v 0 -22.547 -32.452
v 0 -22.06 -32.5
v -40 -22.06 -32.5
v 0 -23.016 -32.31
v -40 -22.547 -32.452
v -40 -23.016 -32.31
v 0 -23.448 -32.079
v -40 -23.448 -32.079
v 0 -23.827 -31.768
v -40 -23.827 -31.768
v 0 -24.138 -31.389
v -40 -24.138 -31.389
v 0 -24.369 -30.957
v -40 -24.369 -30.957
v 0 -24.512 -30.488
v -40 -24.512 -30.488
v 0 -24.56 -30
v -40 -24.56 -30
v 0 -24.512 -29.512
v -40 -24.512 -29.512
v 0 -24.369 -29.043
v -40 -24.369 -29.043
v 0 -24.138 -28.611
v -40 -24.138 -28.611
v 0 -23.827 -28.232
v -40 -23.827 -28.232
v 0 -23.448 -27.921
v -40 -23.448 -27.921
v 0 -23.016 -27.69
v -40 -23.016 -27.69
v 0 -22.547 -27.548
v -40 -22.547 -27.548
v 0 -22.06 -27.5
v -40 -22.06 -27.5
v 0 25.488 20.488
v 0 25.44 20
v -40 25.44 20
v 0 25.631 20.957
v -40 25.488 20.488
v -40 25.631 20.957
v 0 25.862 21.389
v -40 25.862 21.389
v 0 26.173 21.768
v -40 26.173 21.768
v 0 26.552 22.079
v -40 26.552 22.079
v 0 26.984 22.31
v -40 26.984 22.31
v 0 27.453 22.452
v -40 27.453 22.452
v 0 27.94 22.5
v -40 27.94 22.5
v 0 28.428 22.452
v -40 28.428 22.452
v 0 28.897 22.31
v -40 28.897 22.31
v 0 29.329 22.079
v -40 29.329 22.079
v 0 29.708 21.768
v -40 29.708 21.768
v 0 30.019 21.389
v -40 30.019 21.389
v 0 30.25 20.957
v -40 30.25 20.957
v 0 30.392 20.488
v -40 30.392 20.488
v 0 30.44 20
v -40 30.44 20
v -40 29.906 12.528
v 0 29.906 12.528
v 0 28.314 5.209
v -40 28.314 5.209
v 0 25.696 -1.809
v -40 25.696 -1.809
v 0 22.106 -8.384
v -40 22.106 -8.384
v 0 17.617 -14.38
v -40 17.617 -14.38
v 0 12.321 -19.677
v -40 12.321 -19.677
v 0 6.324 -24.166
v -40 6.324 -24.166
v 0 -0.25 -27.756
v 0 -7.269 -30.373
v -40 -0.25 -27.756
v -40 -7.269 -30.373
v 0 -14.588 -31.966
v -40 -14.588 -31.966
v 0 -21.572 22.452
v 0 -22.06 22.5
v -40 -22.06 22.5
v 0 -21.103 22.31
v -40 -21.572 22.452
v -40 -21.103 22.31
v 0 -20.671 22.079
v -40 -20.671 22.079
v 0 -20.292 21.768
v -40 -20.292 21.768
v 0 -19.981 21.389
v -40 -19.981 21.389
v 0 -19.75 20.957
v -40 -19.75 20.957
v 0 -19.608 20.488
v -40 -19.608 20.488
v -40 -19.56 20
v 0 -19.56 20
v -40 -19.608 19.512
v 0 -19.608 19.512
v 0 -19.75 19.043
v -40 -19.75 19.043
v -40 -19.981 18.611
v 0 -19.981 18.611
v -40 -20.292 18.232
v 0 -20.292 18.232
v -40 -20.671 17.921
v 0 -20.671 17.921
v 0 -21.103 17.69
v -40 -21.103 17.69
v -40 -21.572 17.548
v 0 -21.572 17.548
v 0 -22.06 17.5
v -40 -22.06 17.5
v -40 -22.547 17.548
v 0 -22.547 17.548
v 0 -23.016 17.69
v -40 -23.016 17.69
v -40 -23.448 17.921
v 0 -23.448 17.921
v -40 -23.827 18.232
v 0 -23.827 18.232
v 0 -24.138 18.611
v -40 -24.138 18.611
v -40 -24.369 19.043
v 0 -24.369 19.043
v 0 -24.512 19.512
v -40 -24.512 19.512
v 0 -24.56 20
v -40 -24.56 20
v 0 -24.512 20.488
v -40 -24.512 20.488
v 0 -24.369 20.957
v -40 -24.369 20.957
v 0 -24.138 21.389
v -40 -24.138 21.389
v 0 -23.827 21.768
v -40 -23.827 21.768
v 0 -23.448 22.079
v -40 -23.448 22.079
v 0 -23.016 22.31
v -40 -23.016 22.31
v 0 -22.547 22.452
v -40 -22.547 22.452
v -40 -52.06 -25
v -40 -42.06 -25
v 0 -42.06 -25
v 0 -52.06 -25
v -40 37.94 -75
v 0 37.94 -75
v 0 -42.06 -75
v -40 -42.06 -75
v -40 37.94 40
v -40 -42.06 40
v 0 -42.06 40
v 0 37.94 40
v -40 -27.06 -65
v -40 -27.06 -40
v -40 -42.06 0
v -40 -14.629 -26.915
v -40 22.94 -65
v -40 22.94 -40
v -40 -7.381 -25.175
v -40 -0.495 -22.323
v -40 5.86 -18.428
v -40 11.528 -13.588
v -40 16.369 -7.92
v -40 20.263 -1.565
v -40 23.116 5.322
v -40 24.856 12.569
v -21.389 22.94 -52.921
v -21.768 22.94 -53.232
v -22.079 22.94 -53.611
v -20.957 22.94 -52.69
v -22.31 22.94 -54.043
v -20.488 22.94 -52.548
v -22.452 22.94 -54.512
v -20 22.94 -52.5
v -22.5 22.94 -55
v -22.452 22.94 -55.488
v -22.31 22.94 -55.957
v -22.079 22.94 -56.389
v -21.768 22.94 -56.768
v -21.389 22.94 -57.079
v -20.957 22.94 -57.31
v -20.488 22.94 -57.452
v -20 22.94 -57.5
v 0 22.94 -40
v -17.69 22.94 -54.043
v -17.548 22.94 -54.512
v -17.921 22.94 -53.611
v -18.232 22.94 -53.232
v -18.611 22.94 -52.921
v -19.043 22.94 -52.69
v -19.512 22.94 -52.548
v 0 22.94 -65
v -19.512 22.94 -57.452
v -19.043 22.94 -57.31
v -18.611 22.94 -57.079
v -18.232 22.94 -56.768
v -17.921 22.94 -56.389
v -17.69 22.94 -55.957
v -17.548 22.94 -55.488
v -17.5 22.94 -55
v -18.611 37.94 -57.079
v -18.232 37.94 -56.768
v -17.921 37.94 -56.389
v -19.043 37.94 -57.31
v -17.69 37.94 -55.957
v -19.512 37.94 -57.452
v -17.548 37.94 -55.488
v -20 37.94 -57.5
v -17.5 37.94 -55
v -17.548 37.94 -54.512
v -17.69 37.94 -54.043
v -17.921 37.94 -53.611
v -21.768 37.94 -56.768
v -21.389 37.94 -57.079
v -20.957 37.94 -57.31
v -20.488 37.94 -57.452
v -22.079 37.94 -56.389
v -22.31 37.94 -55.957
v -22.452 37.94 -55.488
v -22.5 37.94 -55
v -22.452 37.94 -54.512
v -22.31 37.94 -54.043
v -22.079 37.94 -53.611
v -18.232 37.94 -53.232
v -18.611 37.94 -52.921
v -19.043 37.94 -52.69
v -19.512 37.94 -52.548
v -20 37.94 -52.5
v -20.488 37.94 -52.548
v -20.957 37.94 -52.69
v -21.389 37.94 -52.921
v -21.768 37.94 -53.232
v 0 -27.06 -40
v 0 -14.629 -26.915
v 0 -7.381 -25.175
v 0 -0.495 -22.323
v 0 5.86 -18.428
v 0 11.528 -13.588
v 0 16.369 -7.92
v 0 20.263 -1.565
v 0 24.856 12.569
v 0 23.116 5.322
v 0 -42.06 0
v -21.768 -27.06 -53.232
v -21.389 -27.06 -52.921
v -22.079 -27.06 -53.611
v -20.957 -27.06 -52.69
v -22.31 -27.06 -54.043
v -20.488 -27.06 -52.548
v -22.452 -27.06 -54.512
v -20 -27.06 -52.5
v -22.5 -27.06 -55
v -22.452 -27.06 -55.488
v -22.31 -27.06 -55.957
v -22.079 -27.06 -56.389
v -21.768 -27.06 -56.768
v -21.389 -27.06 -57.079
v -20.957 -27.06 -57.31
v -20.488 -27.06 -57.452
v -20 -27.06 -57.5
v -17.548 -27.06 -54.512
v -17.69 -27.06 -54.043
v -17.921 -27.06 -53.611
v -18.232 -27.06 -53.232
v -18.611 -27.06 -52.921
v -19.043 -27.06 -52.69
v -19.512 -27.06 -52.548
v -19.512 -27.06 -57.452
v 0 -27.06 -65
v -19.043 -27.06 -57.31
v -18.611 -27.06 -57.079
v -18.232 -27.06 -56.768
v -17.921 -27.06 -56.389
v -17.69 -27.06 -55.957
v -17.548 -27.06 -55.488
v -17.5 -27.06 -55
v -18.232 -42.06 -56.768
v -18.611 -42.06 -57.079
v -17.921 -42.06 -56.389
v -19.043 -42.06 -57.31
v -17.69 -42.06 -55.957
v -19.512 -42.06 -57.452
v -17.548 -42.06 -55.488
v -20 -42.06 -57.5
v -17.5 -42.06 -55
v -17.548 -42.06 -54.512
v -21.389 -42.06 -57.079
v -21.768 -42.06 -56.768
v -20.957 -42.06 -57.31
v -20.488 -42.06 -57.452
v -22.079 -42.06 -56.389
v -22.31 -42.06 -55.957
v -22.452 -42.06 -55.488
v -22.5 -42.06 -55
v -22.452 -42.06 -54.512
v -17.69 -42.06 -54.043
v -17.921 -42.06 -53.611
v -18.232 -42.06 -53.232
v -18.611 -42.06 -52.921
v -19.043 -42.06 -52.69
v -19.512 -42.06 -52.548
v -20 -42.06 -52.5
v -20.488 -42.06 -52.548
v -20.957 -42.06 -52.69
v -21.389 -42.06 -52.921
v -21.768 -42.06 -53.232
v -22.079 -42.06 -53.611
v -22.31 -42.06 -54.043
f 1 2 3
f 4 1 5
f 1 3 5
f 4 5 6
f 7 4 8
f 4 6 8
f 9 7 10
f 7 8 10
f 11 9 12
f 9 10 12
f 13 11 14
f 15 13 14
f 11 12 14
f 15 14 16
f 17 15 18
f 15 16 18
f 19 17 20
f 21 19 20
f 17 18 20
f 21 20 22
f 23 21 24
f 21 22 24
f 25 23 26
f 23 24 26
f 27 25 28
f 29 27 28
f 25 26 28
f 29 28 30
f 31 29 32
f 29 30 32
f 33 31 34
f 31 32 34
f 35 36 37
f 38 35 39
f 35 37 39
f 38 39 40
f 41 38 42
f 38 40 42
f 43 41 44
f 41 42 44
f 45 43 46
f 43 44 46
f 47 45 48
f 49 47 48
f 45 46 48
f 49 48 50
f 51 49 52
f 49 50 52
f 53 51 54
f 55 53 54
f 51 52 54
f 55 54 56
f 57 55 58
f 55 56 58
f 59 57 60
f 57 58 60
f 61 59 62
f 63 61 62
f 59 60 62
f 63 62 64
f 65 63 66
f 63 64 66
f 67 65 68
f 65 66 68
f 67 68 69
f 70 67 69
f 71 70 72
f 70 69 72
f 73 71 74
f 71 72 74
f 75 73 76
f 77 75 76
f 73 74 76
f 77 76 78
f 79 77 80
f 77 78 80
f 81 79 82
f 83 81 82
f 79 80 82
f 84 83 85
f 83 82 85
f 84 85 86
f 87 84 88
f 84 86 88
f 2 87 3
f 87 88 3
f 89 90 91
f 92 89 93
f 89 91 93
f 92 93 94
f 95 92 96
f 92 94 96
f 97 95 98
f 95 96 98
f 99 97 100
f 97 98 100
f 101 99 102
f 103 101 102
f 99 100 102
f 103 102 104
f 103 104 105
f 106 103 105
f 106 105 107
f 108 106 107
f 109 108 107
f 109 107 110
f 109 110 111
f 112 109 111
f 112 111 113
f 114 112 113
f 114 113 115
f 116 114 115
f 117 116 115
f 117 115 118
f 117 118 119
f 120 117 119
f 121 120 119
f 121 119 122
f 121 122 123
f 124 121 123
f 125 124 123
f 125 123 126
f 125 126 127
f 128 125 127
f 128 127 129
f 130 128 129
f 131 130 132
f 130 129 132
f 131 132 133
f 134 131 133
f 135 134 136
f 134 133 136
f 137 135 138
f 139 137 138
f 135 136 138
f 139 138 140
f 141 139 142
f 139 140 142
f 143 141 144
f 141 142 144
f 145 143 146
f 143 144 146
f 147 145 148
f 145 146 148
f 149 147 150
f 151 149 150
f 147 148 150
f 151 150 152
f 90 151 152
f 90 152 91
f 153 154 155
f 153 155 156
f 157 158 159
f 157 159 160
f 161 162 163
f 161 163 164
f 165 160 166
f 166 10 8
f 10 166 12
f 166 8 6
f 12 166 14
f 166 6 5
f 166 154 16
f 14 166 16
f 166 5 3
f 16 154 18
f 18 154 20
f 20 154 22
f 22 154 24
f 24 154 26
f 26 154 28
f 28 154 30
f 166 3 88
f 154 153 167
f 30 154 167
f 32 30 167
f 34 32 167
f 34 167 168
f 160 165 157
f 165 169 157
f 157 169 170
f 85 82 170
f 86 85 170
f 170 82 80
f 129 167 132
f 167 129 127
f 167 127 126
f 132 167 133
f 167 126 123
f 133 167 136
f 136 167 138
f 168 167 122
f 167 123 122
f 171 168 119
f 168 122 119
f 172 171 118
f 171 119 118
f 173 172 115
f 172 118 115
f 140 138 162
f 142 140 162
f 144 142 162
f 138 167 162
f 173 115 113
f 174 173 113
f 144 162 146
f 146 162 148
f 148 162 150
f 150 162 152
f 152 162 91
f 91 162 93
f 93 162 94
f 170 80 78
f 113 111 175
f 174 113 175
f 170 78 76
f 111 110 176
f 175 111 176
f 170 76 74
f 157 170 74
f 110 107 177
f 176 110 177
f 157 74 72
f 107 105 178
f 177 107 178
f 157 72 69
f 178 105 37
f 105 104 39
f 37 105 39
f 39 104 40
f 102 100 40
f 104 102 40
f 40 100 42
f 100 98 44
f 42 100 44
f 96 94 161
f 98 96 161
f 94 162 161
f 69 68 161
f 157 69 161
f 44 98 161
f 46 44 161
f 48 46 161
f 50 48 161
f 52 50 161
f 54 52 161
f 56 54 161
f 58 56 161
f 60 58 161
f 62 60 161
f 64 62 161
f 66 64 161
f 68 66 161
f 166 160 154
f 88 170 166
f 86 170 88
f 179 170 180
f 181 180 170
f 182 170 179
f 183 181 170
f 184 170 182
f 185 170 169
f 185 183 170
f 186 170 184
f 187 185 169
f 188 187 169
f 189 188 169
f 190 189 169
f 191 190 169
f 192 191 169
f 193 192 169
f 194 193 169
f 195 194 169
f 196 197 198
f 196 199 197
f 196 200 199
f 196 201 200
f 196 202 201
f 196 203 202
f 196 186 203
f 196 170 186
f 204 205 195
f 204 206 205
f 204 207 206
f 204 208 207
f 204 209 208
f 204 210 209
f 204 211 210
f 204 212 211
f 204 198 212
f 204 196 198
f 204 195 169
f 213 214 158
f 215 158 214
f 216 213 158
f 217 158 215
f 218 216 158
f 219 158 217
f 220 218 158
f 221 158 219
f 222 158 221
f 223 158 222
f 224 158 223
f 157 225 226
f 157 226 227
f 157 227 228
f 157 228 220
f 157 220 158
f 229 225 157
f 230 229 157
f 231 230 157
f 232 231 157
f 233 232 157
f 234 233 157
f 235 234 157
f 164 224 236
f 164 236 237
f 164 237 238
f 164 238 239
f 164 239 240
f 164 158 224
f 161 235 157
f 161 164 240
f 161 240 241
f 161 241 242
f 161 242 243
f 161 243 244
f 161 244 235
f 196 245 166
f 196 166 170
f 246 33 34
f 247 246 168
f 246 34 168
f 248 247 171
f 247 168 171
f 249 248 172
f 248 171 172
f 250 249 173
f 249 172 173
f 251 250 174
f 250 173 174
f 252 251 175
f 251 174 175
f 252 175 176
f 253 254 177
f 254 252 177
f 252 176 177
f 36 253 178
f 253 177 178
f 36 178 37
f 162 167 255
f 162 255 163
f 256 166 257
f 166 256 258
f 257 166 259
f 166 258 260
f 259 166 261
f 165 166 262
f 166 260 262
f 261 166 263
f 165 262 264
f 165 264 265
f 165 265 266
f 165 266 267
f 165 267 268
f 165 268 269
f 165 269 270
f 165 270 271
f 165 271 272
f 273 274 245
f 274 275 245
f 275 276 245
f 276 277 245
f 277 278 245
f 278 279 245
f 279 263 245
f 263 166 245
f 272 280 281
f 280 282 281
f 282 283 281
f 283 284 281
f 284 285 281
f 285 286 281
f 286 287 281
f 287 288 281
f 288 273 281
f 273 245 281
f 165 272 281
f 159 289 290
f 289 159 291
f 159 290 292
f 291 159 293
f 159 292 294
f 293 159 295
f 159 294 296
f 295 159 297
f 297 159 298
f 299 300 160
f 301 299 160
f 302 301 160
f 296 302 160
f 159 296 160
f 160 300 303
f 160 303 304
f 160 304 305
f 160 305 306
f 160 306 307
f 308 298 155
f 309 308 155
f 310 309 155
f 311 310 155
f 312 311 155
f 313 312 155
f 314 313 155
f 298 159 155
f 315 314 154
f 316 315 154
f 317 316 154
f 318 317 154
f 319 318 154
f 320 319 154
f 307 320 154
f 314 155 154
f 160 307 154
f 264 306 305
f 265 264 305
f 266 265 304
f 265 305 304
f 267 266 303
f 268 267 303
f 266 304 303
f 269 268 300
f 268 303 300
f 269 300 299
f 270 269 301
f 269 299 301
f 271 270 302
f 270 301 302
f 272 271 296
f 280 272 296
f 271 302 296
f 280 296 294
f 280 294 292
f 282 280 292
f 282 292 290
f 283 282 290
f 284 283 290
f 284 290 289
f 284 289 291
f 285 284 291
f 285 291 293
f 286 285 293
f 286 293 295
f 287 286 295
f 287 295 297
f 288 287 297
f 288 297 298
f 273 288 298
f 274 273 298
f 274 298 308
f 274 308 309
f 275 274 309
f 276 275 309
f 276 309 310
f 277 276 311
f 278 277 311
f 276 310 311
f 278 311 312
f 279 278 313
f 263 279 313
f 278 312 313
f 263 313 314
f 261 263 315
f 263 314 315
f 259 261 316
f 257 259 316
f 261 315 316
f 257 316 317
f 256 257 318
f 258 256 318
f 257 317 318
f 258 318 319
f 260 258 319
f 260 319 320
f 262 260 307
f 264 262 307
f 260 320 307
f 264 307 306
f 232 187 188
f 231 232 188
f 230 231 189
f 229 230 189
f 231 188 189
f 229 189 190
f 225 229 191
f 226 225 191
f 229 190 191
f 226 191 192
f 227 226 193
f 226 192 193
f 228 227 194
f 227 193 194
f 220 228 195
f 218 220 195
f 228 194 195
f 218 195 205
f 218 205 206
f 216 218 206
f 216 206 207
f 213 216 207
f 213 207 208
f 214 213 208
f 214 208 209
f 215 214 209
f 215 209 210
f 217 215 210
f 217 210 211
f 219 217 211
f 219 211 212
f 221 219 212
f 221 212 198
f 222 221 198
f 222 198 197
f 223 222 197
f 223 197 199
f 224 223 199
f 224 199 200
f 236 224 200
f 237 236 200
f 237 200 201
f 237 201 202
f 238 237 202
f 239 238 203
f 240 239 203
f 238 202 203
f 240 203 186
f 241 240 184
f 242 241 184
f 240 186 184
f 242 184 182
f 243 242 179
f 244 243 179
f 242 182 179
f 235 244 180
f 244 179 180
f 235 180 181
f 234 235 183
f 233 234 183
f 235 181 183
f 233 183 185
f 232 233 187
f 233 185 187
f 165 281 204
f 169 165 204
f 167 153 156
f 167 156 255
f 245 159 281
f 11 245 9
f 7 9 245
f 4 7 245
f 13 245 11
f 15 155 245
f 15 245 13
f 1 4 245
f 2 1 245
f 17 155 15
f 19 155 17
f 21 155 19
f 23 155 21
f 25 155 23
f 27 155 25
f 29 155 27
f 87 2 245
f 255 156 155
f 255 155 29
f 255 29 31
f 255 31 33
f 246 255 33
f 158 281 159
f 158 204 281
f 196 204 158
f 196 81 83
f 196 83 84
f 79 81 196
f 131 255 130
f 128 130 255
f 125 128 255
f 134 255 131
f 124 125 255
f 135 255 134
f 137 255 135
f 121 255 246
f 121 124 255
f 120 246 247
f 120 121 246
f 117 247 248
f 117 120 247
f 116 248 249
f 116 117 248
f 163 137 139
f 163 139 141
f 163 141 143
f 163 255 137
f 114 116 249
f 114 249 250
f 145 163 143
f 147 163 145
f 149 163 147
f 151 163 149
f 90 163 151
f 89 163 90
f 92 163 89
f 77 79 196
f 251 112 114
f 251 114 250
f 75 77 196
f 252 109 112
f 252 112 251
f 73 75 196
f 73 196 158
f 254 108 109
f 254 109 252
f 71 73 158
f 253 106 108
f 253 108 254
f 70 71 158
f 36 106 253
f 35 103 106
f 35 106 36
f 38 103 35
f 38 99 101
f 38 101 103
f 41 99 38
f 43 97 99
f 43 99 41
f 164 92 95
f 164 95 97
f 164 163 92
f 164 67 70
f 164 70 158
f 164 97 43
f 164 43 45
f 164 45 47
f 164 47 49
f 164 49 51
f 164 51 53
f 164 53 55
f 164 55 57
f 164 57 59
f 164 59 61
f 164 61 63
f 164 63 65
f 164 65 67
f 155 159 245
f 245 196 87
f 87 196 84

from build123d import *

# Parameters (mm, degrees)
SALIENTE_EXTRUIR1_DEPTH           = 40
CROQUIS2_W                        = 40
CROQUIS2_H                        = 80
SALIENTE_EXTRUIR2_DEPTH           = 50
CORTAR_EXTRUIR1_DEPTH             = 41
CROQUIS4_W                        = 25.000000038
CROQUIS4_H                        = 50
CORTAR_EXTRUIR2_DEPTH             = 41
DI_METRO_DE_TALADRO_5_0_5_1_D     = 5
DI_METRO_DE_TALADRO_5_0_5_1_DEPTH = 25.000025
DI_METRO_DE_TALADRO_5_0_5_2_D     = 5
DI_METRO_DE_TALADRO_5_0_5_2_DEPTH = 40.00005
DI_METRO_DE_TALADRO_5_0_5_3_D     = 5
DI_METRO_DE_TALADRO_5_0_5_3_DEPTH = 90.000025


with BuildPart() as part:
    # Croquis1 → Saliente-Extruir1 (new body)
    with BuildSketch(Plane(origin=(-40, 0, 0), x_dir=(0, -1, 0), z_dir=(-1, 0, 0))):
        Polygon((-37.940430416, 40), (-37.940430416, -25), (52.059569584, -25), (42.059569584, 0), (42.059569584, 40), align=None)
    extrude(amount=-SALIENTE_EXTRUIR1_DEPTH)

    # Croquis2 → Saliente-Extruir2 (add)
    with BuildSketch(Plane(origin=(0, 0, -25), x_dir=(-1, 0, 0), z_dir=(0, 0, -1))):
        with Locations((20, -2.059569584)):
            Rectangle(CROQUIS2_W, CROQUIS2_H)
    extrude(amount=SALIENTE_EXTRUIR2_DEPTH)

    # Croquis3 → Cortar-Extruir1 (cut, through all)
    with BuildSketch(Plane.ZY.offset(40)):
        with BuildLine():
            ThreePointArc((-32.5, -22.059569584), (-30, -24.559569584), (-27.5, -22.059569584))
            ThreePointArc((-27.5, -22.059569584), (-13.587572106, 11.528002522), (20, 25.440430416))
            ThreePointArc((20, 25.440430416), (22.5, 27.940430416), (20, 30.440430416))
            ThreePointArc((20, 30.440430416), (-17.123106012, 15.063536428), (-32.5, -22.059569584))
        make_face()
    extrude(amount=-CORTAR_EXTRUIR1_DEPTH, mode=Mode.SUBTRACT)

    # Croquis4 → Cortar-Extruir2 (cut, through all)
    with BuildSketch(Plane(origin=(0, 0, 0), x_dir=(0, 0, -1), z_dir=(1, 0, 0))):
        with Locations((52.499999981, -2.059569584)):
            Rectangle(CROQUIS4_W, CROQUIS4_H)
    extrude(amount=-CORTAR_EXTRUIR2_DEPTH, mode=Mode.SUBTRACT)

    # Diámetro de taladro Ø5.0 (5)1
    with Locations(Plane(origin=(0, -27.059569584, 0), x_dir=(1, 0, 0), z_dir=(0, 1, 0))):
        with Locations((-20, 55)):
            Hole(DI_METRO_DE_TALADRO_5_0_5_1_D / 2, depth=DI_METRO_DE_TALADRO_5_0_5_1_DEPTH)

    # Diámetro de taladro Ø5.0 (5)2
    with Locations(Plane(origin=(0, 0, 0), x_dir=(0, 0, -1), z_dir=(1, 0, 0))):
        with Locations((-20, -22.059569584)):
            Hole(DI_METRO_DE_TALADRO_5_0_5_2_D / 2, depth=DI_METRO_DE_TALADRO_5_0_5_2_DEPTH)

    # Diámetro de taladro Ø5.0 (5)3
    with Locations(Plane(origin=(0, 37.940430416, 0), x_dir=(1, 0, 0), z_dir=(0, 1, 0))):
        with Locations((-20, 55)):
            Hole(DI_METRO_DE_TALADRO_5_0_5_3_D / 2, depth=DI_METRO_DE_TALADRO_5_0_5_3_DEPTH)


solid = part.part
